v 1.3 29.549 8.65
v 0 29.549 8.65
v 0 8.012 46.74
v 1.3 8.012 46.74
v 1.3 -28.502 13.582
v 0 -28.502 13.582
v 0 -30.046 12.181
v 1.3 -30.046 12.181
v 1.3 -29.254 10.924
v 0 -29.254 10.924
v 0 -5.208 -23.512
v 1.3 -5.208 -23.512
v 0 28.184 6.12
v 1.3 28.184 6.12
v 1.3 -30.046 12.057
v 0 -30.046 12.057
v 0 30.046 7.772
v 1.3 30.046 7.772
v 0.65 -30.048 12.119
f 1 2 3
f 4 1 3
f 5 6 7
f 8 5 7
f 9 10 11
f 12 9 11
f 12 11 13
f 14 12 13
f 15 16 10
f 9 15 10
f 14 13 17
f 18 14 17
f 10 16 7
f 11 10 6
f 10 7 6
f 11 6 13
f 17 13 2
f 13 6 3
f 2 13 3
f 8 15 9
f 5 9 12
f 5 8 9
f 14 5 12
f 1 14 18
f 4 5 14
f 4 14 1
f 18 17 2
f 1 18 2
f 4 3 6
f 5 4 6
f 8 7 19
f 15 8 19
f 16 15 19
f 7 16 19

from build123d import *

# Parameters (mm, degrees)
F1_DEPTH = 1.3


with BuildPart() as f1:
    # F0 (on Right) → F1 (new body)
    with BuildSketch(Plane.YZ):
        with BuildLine():
            Line((-28.5022601296, 13.5822960047), (-30.0456807017, 12.1807558462))
            add(Edge.make_bspline(
                [(-30.0456807017, 12.1807558462), (-30.050324092, 12.1191925835), (-30.0456807017, 12.056948002)],
                knots=[0, 0, 0, 0.0248618931, 0.0248618931, 0.0248618931], degree=2, weights=[1, 0.9999227368, 1]))
            Line((-30.0456807017, 12.056948002), (-29.2544480902, 10.9238724842))
            add(Edge.make_bspline(
                [(-29.2544480902, 10.9238724842), (-6.4495956437, -6.866929483), (28.1840730012, 6.1202085385)],
                knots=[0.2427638345, 0.2427638345, 0.2427638345, 2.7999505323, 2.7999505323, 2.7999505323], degree=2, weights=[1, 0.2880625196, 1]))
            Line((28.1840730012, 6.1202085385), (30.0456807017, 7.7721911115))
            Line((30.0456807017, 7.7721911115), (29.5491017408, 8.6504284676))
            add(Edge.make_bspline(
                [(29.5491017408, 8.6504284676), (25.3237843176, 12.7552573017), (2.096655059, 14.7285637166), (-21.1304741996, 16.7018701315), (-28.5022601296, 13.5822960047)],
                knots=[3.3365042971, 3.3365042971, 3.3365042971, 4.6549863272, 4.6549863272, 5.9734683573, 5.9734683573, 5.9734683573], degree=2, weights=[1, 0.7904573504, 1, 0.7904573504, 1]))
        make_face()
        with BuildLine():
            Line((8.01217556, 46.7401072383), (-28.5022601296, 13.5822960047))
            add(Edge.make_bspline(
                [(29.5491017408, 8.6504284676), (25.3237843176, 12.7552573017), (2.096655059, 14.7285637166), (-21.1304741996, 16.7018701315), (-28.5022601296, 13.5822960047)],
                knots=[3.3365042971, 3.3365042971, 3.3365042971, 4.6549863272, 4.6549863272, 5.9734683573, 5.9734683573, 5.9734683573], degree=2, weights=[1, 0.7904573504, 1, 0.7904573504, 1]))
            Line((29.5491017408, 8.6504284676), (8.01217556, 46.7401072383))
        make_face()
        with BuildLine():
            add(Edge.make_bspline(
                [(-29.2544480902, 10.9238724842), (-6.4495956437, -6.866929483), (28.1840730012, 6.1202085385)],
                knots=[0.2427638345, 0.2427638345, 0.2427638345, 2.7999505323, 2.7999505323, 2.7999505323], degree=2, weights=[1, 0.2880625196, 1]))
            Line((-29.2544480902, 10.9238724842), (-5.2079111338, -23.5116928816))
            Line((-5.2079111338, -23.5116928816), (28.1840730012, 6.1202085385))
        make_face()
    extrude(amount=F1_DEPTH)


solid = f1.part
